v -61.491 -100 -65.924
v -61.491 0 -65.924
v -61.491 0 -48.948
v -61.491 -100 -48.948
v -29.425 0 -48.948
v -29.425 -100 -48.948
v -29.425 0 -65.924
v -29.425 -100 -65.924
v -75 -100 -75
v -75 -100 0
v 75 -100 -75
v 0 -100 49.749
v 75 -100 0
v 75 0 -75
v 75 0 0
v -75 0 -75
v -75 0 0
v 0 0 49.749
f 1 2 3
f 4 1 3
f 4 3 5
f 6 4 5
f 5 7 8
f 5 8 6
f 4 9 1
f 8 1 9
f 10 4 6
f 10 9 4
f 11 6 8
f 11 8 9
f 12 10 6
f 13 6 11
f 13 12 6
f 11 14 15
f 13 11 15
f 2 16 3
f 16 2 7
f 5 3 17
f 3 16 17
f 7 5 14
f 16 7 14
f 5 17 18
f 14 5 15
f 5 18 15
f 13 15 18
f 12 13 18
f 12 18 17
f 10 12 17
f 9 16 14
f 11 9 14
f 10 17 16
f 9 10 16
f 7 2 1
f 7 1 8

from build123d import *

# Parameters (mm, degrees)
F0_W     = 32.065868
F0_H     = 16.976055
F0_W_2   = 15
F0_H_2   = 30
F1_DEPTH = 100


with BuildPart() as f1:
    # F0 (on Front) → F1 (new body)
    with BuildSketch(Plane.XZ):
        Polygon((-75, 0), (-75, -75), (-7.090706, -75), (-7.090706, -45), (7.909294, -45), (7.909294, -75), (75, -75), (75, 0), align=None)
        with Locations((-45.458086, -57.435633)):
            Rectangle(F0_W, F0_H, mode=Mode.SUBTRACT)
        Polygon((0, 49.749372), (-75, 0), (75, 0), align=None)
        with Locations((0.409294, -60)):
            Rectangle(F0_W_2, F0_H_2)
    extrude(amount=F1_DEPTH)


solid = f1.part
